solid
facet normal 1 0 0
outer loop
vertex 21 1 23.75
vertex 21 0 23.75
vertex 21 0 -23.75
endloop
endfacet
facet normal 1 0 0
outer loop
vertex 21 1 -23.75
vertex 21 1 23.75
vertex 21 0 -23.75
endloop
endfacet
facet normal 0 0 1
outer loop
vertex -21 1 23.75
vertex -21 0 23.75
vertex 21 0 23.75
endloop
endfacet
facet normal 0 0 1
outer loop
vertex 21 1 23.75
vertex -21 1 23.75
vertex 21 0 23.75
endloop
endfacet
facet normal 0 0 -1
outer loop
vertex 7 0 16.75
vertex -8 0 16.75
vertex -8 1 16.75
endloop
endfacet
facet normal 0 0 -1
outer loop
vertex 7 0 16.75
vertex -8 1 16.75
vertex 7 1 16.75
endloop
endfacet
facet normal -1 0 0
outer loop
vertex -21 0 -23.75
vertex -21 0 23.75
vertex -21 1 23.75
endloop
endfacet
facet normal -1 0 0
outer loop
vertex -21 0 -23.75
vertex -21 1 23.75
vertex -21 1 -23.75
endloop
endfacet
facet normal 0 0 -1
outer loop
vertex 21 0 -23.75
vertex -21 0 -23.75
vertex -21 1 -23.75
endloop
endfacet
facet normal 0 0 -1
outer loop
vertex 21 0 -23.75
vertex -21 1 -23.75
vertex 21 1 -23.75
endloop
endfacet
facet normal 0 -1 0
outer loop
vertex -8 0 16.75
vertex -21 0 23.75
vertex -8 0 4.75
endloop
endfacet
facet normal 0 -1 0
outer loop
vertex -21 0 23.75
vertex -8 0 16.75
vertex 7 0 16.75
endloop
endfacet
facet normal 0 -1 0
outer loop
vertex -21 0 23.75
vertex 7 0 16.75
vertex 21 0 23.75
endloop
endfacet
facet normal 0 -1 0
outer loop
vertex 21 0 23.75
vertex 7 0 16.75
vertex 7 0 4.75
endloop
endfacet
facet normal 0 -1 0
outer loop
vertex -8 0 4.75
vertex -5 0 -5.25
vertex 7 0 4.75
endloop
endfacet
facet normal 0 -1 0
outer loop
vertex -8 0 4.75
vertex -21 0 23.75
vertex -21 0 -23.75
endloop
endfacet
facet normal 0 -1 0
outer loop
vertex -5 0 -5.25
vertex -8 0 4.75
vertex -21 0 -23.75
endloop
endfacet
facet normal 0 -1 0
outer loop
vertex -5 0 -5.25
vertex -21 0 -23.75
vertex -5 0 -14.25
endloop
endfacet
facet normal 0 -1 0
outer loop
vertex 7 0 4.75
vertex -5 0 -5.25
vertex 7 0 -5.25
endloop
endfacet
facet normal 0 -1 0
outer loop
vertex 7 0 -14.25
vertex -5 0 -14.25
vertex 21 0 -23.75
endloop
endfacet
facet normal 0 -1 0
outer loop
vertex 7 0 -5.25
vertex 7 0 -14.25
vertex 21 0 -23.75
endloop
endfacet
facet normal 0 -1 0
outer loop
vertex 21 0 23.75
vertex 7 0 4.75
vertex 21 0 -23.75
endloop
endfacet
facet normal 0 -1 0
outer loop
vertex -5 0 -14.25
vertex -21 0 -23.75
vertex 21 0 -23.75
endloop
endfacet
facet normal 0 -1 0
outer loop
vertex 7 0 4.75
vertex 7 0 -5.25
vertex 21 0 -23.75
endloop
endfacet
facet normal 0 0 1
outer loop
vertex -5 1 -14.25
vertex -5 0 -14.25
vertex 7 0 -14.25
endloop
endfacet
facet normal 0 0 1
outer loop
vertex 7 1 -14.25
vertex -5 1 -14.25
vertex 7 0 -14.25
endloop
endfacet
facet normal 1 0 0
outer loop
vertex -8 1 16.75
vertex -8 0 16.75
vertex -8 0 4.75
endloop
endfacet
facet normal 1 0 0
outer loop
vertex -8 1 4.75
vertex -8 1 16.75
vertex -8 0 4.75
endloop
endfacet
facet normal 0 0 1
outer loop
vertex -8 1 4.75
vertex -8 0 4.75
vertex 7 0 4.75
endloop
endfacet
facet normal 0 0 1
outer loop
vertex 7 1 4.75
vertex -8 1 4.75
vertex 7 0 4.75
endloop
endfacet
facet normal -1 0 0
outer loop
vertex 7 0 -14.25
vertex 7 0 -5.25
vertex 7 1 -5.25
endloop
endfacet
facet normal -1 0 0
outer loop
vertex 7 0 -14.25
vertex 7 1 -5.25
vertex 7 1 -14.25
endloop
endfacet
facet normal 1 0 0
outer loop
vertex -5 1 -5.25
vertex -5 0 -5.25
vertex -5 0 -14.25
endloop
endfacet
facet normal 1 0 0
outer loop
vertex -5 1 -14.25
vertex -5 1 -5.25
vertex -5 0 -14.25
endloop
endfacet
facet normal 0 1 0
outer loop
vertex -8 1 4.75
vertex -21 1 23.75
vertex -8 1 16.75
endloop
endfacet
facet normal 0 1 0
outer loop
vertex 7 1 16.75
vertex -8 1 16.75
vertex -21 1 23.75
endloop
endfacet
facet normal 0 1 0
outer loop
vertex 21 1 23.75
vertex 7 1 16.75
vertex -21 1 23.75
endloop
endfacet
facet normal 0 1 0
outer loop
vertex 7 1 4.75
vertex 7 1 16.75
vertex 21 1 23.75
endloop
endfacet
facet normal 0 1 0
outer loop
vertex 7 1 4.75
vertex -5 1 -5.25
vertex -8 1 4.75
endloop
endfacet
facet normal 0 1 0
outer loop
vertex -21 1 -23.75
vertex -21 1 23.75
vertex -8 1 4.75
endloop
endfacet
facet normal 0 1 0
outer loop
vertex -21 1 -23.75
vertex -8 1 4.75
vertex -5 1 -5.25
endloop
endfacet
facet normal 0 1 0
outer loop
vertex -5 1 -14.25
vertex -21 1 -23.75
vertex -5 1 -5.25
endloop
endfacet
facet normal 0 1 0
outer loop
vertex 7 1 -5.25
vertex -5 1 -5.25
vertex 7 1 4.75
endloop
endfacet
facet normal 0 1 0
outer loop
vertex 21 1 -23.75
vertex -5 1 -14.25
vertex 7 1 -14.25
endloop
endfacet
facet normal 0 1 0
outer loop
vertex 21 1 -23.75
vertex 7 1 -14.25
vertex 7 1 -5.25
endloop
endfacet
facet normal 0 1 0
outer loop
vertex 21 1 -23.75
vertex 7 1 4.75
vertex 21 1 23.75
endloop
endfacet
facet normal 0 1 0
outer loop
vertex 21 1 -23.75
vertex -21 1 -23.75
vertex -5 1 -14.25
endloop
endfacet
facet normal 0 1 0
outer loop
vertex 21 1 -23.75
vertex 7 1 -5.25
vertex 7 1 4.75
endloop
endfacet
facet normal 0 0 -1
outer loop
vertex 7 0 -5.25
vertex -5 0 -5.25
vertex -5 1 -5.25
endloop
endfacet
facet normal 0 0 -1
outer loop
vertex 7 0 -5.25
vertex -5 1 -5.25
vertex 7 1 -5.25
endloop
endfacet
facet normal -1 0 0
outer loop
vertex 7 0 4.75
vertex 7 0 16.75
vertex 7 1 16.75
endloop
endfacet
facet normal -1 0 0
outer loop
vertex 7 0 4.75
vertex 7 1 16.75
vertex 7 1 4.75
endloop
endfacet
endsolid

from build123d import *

# Parameters (mm, degrees)
SKETCH1_W           = 42
SKETCH1_H           = 47.5
BOSS_EXTRUDE1_DEPTH = 1
SKETCH2_W           = 15
SKETCH2_H           = 12
SKETCH2_W_2         = 12
SKETCH2_H_2         = 9
CUT_EXTRUDE3_DEPTH  = 25


with BuildPart() as part:
    # Sketch1 → Boss-Extrude1 (new body)
    with BuildSketch(Plane(origin=(0, 0, 0), x_dir=(1, 0, 0), z_dir=(0, 1, 0))):
        Rectangle(SKETCH1_W, SKETCH1_H)
    extrude(amount=BOSS_EXTRUDE1_DEPTH)

    # Sketch2 → Cut-Extrude3 (cut)
    with BuildSketch(Plane(origin=(0, 0, 0), x_dir=(1, 0, 0), z_dir=(0, 1, 0))):
        with Locations((-0.5, -10.75)):
            Rectangle(SKETCH2_W, SKETCH2_H)
        with Locations((1, 9.75)):
            Rectangle(SKETCH2_W_2, SKETCH2_H_2)
    extrude(amount=CUT_EXTRUDE3_DEPTH, mode=Mode.SUBTRACT)


solid = part.part
